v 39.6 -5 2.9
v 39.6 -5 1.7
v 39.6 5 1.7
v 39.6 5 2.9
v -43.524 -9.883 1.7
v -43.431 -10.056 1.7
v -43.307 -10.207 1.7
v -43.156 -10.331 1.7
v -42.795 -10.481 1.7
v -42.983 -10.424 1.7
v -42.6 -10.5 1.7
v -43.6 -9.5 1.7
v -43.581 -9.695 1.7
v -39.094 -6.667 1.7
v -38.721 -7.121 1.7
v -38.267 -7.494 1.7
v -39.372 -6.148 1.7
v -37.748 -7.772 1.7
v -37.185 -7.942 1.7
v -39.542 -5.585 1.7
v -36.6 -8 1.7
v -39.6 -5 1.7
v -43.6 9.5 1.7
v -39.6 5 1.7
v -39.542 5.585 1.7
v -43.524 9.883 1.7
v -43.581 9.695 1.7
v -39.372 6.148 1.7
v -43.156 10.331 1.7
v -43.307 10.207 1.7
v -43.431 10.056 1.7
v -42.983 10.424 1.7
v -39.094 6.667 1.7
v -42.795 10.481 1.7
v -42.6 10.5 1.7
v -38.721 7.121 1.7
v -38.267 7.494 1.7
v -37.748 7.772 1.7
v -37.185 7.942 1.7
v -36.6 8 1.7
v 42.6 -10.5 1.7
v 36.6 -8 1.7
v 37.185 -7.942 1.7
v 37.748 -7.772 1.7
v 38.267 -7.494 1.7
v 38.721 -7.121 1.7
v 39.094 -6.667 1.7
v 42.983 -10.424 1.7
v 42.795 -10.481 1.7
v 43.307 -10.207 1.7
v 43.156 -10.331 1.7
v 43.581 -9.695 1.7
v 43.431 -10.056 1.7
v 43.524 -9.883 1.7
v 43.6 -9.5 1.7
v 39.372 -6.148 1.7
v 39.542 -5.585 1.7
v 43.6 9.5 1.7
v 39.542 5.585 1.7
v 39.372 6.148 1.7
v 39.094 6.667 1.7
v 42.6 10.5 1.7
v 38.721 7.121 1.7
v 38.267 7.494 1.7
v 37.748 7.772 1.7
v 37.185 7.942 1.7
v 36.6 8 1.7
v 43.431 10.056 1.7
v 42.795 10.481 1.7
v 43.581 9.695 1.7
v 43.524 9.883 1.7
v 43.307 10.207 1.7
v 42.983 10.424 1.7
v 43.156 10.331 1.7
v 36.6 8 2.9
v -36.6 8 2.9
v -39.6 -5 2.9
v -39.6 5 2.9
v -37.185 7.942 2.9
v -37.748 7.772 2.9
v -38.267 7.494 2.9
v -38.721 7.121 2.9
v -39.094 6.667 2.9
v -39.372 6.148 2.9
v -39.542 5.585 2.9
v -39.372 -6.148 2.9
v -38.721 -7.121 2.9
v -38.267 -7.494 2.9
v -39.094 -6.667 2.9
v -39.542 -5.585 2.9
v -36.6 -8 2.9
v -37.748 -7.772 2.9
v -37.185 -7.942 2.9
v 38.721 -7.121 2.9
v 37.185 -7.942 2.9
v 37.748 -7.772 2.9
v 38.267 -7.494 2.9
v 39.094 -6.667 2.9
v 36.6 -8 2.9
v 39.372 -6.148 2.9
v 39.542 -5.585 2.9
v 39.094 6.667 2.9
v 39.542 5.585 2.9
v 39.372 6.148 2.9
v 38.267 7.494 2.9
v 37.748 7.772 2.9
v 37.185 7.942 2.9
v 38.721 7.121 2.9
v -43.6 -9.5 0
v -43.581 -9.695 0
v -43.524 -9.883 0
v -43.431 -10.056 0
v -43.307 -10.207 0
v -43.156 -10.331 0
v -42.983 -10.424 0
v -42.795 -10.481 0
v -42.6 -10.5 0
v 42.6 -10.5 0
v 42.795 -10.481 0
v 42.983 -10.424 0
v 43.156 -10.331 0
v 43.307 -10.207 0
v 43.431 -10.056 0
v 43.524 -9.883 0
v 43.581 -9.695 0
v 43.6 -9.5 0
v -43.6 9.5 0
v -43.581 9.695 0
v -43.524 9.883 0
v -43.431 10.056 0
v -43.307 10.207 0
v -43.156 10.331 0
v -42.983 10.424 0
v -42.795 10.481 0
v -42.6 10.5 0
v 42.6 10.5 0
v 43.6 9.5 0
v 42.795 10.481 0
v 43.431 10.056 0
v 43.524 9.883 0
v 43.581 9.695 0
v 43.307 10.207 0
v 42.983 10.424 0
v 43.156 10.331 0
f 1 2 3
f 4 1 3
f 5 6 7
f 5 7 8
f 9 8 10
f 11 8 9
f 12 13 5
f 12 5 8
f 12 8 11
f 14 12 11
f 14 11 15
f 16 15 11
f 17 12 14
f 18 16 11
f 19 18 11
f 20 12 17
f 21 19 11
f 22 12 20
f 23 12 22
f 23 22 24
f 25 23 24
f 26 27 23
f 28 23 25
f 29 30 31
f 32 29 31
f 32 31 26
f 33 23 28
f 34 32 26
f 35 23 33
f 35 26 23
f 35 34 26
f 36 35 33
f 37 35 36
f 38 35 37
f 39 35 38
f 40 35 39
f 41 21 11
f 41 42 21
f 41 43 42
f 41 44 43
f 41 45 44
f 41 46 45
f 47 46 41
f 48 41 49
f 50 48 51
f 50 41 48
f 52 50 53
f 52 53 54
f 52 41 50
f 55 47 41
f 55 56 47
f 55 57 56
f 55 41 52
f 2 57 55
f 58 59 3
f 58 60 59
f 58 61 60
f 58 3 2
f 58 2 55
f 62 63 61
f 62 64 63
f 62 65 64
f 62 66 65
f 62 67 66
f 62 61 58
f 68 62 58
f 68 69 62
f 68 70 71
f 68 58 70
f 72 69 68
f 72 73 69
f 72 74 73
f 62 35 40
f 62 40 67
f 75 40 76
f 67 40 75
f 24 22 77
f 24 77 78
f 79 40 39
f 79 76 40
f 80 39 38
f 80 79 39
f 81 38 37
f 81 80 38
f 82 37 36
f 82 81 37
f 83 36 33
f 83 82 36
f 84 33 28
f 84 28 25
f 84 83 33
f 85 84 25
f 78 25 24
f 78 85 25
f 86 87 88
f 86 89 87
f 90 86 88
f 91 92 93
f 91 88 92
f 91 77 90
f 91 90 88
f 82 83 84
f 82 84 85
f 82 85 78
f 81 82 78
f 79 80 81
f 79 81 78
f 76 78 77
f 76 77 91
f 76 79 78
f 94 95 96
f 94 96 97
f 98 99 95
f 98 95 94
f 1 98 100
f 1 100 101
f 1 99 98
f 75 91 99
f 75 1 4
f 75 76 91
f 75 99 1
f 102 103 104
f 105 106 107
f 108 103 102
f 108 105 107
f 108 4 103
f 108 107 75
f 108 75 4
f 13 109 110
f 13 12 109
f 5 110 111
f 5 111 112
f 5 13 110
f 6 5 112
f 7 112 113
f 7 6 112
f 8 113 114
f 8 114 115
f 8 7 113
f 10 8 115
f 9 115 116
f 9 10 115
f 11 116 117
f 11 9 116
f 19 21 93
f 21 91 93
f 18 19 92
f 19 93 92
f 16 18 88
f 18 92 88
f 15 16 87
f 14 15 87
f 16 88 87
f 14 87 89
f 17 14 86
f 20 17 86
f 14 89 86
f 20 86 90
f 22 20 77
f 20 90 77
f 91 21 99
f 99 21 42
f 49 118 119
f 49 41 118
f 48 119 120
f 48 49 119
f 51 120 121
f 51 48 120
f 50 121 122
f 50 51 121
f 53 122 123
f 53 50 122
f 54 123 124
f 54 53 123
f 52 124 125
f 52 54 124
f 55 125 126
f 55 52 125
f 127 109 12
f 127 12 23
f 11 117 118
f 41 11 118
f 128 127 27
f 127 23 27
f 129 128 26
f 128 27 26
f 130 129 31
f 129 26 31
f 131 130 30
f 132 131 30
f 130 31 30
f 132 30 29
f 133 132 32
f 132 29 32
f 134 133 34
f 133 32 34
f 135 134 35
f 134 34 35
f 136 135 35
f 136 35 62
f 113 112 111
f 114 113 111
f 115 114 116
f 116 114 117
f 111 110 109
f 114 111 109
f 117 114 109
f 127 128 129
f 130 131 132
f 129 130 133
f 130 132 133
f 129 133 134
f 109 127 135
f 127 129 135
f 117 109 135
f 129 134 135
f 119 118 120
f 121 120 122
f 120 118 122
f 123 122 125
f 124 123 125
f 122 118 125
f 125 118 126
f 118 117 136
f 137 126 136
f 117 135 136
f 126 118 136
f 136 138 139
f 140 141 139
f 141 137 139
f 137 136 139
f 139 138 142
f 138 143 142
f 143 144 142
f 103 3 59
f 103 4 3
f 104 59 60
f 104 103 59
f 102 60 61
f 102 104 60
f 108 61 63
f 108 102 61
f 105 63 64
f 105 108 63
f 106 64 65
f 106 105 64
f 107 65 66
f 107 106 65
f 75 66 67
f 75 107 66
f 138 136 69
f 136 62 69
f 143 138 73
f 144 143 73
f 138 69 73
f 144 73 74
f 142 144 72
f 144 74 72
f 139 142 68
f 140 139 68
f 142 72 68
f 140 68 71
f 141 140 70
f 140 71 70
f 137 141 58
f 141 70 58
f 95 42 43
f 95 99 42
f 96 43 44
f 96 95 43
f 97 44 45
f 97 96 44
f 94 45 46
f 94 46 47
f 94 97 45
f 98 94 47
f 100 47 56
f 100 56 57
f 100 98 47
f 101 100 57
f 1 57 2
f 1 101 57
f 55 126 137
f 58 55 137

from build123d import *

# Parameters (mm, degrees)
SKETCH_1_W      = 87.2
SKETCH_1_H      = 21
EXTRUDE_1_DEPTH = 1.7
SKETCH_2_W      = 79.2
SKETCH_2_H      = 16
EXTRUDE_2_DEPTH = 1.2
FILLET_1_R      = 3
FILLET_2_R      = 1


with BuildPart() as part:
    # Эскиз1 → Бобышка-Вытянуть1 (new body)
    with BuildSketch(Plane.XY):
        Rectangle(SKETCH_1_W, SKETCH_1_H)
    extrude(amount=EXTRUDE_1_DEPTH)

    # Эскиз2 → Бобышка-Вытянуть2 (add)
    with BuildSketch(Plane.XY.offset(1.7)):
        Rectangle(SKETCH_2_W, SKETCH_2_H)
    extrude(amount=EXTRUDE_2_DEPTH)

    # Скругление1
    fillet_1_edges = [part.edges().sort_by_distance(p)[0] for p in [
        (39.6, -8, 2.3),
        (39.6, 8, 2.3),
        (-39.6, 8, 2.3),
        (-39.6, -8, 2.3),
    ]]
    fillet(fillet_1_edges, radius=FILLET_1_R)

    # Скругление2
    fillet_2_edges = [part.edges().sort_by_distance(p)[0] for p in [
        (43.6, -10.5, 0.85),
        (-43.6, -10.5, 0.85),
        (-43.6, 10.5, 0.85),
        (43.6, 10.5, 0.85),
    ]]
    fillet(fillet_2_edges, radius=FILLET_2_R)


solid = part.part
